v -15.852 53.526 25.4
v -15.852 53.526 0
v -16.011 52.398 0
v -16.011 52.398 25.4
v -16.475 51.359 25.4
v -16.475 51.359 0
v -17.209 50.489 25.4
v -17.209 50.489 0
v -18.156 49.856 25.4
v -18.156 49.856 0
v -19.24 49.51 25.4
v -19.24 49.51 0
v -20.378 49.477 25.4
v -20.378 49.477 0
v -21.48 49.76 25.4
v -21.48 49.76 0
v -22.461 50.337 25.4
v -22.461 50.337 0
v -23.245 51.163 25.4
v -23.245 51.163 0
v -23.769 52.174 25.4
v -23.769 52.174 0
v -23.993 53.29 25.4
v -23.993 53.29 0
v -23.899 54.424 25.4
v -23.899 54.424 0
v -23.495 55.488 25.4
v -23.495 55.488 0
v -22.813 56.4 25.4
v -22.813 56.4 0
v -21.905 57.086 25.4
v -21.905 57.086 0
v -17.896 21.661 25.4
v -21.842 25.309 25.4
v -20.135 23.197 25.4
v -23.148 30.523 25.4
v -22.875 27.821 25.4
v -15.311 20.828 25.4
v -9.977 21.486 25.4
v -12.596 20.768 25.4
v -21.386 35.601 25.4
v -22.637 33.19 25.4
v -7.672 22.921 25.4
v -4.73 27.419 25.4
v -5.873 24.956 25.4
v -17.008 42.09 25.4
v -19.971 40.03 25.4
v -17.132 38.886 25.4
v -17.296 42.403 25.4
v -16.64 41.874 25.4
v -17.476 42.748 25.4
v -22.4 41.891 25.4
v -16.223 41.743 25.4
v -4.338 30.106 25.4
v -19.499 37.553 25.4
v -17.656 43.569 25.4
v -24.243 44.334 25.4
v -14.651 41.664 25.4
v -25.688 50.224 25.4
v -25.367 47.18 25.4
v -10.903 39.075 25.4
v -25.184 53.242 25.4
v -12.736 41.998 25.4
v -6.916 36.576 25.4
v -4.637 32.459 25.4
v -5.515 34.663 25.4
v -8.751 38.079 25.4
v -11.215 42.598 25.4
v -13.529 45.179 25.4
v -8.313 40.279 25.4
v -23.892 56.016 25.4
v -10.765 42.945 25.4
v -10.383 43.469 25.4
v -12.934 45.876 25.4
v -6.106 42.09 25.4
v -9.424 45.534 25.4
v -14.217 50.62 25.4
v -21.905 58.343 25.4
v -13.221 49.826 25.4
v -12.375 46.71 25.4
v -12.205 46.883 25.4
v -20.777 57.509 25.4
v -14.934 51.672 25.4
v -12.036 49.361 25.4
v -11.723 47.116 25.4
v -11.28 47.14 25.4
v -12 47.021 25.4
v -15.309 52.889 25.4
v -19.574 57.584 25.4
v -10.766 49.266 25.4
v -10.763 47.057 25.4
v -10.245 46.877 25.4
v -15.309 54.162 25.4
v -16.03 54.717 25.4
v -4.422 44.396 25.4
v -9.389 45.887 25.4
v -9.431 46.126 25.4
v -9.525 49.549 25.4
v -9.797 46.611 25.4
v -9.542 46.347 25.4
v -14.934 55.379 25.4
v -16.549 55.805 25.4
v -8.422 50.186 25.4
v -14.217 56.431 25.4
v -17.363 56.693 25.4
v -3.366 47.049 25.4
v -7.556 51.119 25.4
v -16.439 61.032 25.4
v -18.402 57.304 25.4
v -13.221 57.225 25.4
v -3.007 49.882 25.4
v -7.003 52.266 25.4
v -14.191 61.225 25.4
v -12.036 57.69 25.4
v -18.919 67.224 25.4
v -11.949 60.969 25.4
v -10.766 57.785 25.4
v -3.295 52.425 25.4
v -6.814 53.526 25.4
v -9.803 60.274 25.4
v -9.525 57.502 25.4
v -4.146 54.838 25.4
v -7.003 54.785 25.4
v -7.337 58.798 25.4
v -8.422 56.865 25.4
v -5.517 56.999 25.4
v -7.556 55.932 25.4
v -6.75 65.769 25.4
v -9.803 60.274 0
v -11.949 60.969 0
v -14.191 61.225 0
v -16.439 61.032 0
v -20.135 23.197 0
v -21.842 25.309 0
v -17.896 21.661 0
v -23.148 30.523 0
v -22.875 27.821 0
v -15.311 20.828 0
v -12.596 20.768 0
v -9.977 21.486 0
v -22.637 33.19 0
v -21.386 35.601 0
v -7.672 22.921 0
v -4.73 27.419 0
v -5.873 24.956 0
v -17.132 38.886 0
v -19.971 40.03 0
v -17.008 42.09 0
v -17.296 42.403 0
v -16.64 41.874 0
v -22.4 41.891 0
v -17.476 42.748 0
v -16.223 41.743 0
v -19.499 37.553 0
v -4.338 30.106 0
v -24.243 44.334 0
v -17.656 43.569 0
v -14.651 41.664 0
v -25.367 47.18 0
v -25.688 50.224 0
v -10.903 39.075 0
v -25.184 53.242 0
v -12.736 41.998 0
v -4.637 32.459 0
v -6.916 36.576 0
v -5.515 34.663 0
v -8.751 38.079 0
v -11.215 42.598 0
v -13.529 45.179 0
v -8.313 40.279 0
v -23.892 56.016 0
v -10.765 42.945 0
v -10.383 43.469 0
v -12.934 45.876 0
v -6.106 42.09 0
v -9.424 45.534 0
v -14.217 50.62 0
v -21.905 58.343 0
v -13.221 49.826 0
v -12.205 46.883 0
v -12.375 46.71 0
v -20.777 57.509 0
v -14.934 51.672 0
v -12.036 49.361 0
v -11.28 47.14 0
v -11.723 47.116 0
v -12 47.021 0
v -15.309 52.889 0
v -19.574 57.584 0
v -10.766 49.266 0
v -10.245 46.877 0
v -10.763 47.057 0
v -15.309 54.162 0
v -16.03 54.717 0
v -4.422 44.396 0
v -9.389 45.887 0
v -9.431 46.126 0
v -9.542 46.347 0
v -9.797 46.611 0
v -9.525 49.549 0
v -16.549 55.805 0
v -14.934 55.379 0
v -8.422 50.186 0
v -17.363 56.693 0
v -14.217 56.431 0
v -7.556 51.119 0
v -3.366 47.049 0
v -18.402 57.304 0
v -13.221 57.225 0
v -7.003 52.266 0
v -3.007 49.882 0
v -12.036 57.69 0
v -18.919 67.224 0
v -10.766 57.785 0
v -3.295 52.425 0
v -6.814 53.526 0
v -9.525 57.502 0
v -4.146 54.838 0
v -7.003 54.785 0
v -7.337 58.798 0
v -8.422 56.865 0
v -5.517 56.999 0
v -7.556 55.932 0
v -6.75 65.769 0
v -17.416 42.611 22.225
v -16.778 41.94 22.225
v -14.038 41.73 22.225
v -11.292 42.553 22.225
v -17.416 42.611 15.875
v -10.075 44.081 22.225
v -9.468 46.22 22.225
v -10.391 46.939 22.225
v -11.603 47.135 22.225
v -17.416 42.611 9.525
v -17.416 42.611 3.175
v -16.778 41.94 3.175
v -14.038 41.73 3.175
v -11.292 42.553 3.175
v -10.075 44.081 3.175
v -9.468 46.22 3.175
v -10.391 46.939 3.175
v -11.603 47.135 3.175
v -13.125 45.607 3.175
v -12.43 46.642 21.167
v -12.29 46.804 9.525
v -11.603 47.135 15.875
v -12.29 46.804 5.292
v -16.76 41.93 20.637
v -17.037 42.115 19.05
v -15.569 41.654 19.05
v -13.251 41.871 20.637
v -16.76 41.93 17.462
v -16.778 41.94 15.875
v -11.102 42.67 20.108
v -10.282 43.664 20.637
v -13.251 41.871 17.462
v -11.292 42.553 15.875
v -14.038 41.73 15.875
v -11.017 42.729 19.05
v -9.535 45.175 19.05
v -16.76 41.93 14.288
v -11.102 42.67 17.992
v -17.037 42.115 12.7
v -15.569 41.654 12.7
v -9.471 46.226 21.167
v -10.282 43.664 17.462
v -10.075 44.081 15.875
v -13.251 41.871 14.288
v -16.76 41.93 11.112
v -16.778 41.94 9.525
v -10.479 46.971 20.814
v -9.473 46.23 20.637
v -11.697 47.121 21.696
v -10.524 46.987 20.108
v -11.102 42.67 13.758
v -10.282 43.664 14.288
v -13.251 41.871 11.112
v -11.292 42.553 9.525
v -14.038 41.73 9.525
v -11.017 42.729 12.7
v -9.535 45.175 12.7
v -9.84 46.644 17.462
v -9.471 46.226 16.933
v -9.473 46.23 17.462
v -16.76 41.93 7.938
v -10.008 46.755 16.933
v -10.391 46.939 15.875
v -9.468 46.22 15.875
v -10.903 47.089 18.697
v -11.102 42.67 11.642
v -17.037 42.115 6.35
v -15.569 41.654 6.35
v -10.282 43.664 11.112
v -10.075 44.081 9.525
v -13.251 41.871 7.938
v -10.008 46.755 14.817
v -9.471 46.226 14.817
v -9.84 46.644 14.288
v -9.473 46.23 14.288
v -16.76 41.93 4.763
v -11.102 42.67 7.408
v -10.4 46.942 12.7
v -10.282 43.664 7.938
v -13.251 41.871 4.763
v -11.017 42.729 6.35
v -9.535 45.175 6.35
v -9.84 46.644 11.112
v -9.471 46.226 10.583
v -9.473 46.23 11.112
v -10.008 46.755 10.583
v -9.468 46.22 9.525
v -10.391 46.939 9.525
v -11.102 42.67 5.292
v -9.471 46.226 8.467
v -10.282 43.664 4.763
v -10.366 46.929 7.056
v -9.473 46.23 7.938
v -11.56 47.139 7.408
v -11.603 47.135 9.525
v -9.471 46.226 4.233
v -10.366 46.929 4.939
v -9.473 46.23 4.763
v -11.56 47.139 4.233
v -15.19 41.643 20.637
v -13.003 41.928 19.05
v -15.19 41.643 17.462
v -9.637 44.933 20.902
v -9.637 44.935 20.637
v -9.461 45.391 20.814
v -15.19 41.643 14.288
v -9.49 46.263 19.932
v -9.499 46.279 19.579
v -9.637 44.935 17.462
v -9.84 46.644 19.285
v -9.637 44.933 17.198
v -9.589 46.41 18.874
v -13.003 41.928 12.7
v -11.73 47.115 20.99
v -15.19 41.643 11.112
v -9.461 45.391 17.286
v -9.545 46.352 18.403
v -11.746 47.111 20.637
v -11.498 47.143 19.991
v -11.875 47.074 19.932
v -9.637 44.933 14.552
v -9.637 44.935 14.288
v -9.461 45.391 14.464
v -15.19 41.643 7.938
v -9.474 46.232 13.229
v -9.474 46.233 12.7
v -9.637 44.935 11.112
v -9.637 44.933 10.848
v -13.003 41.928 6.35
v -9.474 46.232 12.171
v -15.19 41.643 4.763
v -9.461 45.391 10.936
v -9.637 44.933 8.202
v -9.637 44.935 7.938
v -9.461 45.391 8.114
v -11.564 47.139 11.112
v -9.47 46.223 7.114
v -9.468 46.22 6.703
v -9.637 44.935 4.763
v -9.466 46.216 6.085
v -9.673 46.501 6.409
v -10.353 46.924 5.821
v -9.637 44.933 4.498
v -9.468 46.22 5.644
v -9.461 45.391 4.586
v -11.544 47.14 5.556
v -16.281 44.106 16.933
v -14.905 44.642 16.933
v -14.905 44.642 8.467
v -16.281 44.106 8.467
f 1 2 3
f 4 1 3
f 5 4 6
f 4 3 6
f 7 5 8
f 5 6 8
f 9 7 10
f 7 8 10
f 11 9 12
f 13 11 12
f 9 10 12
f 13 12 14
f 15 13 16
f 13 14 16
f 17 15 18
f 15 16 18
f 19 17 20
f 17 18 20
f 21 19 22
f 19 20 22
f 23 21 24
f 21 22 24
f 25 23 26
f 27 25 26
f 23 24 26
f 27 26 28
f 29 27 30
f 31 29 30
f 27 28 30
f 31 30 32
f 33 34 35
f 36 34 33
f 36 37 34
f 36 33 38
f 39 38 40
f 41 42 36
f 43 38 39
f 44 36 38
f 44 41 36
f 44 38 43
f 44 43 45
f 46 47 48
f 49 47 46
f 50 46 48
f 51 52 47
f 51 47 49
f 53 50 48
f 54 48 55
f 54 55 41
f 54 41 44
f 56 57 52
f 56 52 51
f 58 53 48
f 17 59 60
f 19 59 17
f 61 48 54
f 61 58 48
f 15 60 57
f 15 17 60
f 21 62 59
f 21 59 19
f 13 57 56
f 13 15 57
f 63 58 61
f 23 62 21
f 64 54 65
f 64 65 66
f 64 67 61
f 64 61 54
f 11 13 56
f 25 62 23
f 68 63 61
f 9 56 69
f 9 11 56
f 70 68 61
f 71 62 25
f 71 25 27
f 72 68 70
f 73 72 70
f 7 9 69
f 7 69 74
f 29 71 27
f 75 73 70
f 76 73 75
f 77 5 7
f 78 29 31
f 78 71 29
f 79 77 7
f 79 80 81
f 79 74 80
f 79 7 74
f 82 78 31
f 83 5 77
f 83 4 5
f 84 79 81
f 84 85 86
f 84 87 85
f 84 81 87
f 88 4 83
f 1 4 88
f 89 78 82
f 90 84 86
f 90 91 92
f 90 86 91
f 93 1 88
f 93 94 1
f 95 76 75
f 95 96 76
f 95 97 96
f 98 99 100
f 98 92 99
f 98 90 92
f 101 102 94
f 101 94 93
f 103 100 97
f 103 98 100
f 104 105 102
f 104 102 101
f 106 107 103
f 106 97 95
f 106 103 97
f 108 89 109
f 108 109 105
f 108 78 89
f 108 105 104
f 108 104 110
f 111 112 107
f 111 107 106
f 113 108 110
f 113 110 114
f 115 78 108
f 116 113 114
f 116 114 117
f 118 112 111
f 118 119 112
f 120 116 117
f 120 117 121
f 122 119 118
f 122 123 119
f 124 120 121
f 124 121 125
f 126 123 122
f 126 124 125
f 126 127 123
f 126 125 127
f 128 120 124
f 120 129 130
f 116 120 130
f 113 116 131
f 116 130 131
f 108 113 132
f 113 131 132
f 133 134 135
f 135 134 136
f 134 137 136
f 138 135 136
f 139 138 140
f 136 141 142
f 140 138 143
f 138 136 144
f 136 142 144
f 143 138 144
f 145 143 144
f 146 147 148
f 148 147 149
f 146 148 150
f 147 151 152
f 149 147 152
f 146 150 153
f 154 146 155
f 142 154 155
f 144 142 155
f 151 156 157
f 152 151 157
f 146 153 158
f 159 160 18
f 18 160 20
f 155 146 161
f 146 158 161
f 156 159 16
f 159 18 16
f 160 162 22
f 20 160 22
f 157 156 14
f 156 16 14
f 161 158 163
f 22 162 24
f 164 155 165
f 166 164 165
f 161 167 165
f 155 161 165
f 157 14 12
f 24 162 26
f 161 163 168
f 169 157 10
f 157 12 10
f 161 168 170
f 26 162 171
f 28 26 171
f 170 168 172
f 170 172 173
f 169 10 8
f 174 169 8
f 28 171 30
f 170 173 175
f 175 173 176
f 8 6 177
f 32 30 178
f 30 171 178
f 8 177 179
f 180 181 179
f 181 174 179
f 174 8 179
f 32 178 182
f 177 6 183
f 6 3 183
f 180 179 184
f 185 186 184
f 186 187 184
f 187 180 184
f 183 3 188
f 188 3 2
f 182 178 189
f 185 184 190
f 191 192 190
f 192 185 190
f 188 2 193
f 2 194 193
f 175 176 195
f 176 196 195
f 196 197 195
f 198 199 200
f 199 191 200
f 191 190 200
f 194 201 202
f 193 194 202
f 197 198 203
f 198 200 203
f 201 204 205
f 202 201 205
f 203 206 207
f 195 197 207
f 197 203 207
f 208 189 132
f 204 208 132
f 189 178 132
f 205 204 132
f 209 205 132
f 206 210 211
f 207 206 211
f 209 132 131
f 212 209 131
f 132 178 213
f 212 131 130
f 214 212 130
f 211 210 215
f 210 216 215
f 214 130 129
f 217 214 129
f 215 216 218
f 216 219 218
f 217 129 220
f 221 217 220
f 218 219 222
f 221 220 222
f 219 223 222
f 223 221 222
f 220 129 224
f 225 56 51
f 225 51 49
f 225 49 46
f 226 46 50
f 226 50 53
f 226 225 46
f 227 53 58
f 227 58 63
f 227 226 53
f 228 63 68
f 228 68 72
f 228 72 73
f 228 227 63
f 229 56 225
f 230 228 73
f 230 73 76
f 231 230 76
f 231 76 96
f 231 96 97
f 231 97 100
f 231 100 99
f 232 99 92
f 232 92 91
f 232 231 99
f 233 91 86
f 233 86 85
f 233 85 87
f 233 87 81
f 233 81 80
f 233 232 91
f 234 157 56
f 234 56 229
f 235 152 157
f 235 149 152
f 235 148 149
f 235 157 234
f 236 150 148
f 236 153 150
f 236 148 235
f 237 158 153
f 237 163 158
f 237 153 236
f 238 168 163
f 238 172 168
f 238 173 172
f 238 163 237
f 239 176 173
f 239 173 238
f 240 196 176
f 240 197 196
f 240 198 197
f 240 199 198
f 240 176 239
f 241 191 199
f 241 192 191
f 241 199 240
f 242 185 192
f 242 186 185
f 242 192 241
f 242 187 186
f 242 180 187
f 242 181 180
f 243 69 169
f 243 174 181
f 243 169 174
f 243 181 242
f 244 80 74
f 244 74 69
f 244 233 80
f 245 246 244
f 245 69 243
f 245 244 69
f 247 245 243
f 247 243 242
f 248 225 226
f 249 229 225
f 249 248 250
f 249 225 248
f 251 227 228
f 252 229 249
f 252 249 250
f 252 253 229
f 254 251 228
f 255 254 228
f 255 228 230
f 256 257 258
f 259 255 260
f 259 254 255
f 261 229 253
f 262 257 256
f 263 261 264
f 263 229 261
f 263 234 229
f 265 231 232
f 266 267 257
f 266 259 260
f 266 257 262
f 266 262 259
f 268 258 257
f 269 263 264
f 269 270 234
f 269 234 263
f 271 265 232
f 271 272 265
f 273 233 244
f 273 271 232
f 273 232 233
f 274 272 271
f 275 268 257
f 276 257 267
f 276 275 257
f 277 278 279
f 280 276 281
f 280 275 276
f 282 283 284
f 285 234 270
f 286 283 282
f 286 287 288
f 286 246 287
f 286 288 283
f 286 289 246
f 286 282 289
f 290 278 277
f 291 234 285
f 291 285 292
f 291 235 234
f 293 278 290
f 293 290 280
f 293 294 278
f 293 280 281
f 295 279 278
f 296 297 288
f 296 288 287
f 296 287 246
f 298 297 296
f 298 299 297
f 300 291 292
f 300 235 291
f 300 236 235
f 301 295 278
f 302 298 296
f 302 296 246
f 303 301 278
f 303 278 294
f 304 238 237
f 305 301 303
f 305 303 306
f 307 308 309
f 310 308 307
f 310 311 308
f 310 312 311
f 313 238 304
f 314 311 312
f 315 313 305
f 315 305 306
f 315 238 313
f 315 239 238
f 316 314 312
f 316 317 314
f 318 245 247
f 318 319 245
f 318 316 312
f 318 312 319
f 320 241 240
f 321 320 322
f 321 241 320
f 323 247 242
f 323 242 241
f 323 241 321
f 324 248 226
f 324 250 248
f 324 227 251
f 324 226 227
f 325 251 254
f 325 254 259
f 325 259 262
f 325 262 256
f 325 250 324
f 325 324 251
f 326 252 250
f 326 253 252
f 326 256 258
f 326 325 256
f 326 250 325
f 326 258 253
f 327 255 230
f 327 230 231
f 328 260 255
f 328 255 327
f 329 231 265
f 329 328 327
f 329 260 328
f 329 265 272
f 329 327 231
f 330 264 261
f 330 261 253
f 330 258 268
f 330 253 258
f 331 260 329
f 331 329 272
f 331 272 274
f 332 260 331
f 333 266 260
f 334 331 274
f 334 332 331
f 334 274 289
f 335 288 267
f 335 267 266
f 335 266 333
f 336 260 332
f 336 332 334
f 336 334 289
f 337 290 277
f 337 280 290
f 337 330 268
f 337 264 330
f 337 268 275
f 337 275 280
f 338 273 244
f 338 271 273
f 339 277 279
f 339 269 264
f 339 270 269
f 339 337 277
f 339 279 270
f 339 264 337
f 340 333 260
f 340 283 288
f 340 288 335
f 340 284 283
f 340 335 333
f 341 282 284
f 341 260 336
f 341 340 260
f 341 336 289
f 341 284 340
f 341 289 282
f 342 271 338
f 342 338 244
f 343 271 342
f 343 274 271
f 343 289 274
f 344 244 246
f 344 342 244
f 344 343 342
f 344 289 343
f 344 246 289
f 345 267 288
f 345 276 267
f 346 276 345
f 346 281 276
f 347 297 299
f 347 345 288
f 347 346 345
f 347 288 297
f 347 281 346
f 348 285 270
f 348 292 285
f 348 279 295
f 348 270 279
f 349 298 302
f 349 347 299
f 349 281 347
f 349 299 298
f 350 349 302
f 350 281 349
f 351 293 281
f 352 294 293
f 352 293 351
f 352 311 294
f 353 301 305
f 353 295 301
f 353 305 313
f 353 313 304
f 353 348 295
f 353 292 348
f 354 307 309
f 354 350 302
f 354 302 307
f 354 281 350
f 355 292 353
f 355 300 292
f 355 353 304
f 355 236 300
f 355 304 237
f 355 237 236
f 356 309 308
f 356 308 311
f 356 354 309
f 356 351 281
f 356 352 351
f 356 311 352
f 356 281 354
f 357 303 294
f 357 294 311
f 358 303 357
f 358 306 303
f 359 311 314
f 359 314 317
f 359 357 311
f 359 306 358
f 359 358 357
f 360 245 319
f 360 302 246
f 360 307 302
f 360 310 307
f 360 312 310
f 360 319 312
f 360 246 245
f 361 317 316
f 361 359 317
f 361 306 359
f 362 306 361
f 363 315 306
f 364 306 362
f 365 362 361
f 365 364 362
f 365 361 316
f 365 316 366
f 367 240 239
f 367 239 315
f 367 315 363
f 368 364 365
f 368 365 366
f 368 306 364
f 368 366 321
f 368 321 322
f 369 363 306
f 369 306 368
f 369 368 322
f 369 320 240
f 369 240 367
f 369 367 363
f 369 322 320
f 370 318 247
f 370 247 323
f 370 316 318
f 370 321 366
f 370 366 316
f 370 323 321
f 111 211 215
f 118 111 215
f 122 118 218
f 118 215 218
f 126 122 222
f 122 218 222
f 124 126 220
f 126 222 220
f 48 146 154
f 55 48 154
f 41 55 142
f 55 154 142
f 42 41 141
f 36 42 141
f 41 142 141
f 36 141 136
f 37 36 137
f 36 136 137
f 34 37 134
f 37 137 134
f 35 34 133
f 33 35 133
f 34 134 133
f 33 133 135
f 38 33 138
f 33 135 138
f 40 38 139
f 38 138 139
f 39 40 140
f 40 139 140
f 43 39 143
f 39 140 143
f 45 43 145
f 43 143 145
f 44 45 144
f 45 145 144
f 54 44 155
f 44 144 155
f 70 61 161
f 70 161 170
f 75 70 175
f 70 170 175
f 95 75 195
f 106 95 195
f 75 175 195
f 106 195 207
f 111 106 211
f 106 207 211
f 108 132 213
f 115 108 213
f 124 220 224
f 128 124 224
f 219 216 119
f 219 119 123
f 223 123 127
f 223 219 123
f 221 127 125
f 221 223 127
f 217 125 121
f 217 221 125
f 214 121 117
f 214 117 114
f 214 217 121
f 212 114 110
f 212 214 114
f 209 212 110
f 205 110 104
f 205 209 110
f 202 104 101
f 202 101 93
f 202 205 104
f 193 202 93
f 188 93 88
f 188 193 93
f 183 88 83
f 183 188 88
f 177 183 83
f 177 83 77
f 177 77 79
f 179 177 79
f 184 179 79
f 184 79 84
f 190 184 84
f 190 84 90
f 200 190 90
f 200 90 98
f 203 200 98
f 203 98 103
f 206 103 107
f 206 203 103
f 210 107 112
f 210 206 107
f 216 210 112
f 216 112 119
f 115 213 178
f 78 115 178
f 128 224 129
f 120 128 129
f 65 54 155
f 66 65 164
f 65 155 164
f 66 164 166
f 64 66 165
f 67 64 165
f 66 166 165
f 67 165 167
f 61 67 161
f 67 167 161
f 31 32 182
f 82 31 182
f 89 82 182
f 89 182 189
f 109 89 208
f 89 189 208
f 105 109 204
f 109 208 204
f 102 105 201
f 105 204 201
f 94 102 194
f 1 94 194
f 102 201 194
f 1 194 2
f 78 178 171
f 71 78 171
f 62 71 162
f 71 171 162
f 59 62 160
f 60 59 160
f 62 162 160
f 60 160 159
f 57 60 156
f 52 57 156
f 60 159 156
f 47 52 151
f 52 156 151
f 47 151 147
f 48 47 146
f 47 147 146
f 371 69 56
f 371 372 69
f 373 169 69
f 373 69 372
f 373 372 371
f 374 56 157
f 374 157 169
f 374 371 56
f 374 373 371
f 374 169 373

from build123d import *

# Parameters (mm, degrees)
F0_R     = 4.2716595226
F1_DEPTH = 25.4


with BuildPart() as f1:
    # F0 (on Top) → F1 (new body)
    with BuildSketch(Plane.XY):
        with BuildLine():
            ThreePointArc((-10.9032178879, 39.0753542906), (-5.1910846605, 43.1900360944), (-3.0065766643, 49.8823449016))
            ThreePointArc((-3.0065766643, 49.8823449016), (-4.1464339764, 54.8381716861), (-7.3369236625, 58.7980036742))
            ThreePointArc((-7.3369236625, 58.7980036742), (-8.5228526065, 59.6145737818), (-9.8026699948, 60.2743325659))
            ThreePointArc((-9.8026699948, 60.2743325659), (-13.0636710755, 61.1524909109), (-16.4386810378, 61.0316692151))
            ThreePointArc((-16.4386810378, 61.0316692151), (-19.3556506827, 60.0613812277), (-21.9049728752, 58.3434967593))
            ThreePointArc((-21.9049728752, 58.3434967593), (-25.3666424741, 47.1802232161), (-17.1324710859, 38.8856313537))
            ThreePointArc((-17.1324710859, 38.8856313537), (-14.0340082646, 39.511204952), (-10.9032178879, 39.0753542906))
        make_face()
        with BuildLine():
            ThreePointArc((-15.8517292987, 53.5255260112), (-21.9910405068, 50.0141212063), (-21.9049728752, 57.0861575592))
            ThreePointArc((-21.9049728752, 57.0861575592), (-17.8600920101, 57.0369308162), (-15.8517292987, 53.5255260112))
        make_face(mode=Mode.SUBTRACT)
        with BuildLine():
            add(Edge.make_bspline(
                [(-17.6564005526, 43.5692086307), (-17.5851070368, 42.8667576073), (-16.9535474713, 40.9989798958), (-10.7844070302, 42.18138916), (-10.2438965659, 43.9538393646), (-8.6212871203, 46.4841986619), (-11.7256242893, 47.4607807156), (-12.5423545781, 46.5653166922), (-13.0225004053, 45.6741453494), (-13.3887298348, 45.3075260974), (-13.5288280789, 45.1787779989)],
                knots=[0.049875245, 0.049875245, 0.049875245, 0.049875245, 0.1481446361, 0.3526177575, 0.4742514854, 0.6040004548, 0.7366395955, 0.8278864756, 0.9191684515, 0.9736388756, 0.9736388756, 0.9736388756, 0.9736388756], degree=3))
            add(Edge.make_bspline(
                [(-13.5288280789, 45.1787779989), (-14.9046855695, 44.642254876), (-16.2805430601, 44.1057317532), (-17.6564005506, 43.5692086304)],
                knots=[0.0056922948, 0.0056922948, 0.0056922948, 0.0056922948, 4.4359934202, 4.4359934202, 4.4359934202, 4.4359934202], degree=3))
        make_face(mode=Mode.SUBTRACT)
        with Locations((-11.0852297941, 53.5255260112)):
            Circle(F0_R, mode=Mode.SUBTRACT)
        with BuildLine():
            ThreePointArc((-9.8026699948, 60.2743325659), (-8.5228526065, 59.6145737818), (-7.3369236625, 58.7980036742))
            Line((-7.3369236625, 58.7980036742), (-6.7503172904, 65.7686516643))
            Line((-6.7503172904, 65.7686516643), (-9.8026699948, 60.2743325659))
        make_face()
        with BuildLine():
            ThreePointArc((-4.3383381323, 30.106337741), (-6.1549153148, 35.6637855382), (-10.9032178879, 39.0753542906))
            ThreePointArc((-10.9032178879, 39.0753542906), (-14.0045594414, 38.5442993199), (-17.1324710859, 38.8856313537))
            ThreePointArc((-17.1324710859, 38.8856313537), (-19.0712979296, 22.3480222929), (-4.3383381323, 30.106337741))
        make_face()
        with BuildLine():
            ThreePointArc((-17.1324710859, 38.8856313537), (-14.0045594414, 38.5442993199), (-10.9032178879, 39.0753542906))
            ThreePointArc((-10.9032178879, 39.0753542906), (-14.0340082646, 39.511204952), (-17.1324710859, 38.8856313537))
        make_face()
        with BuildLine():
            ThreePointArc((-21.9049728752, 58.3434967593), (-19.3556506827, 60.0613812277), (-16.4386810378, 61.0316692151))
            Line((-16.4386810378, 61.0316692151), (-18.9191132756, 67.2242349982))
            Line((-18.9191132756, 67.2242349982), (-21.9049728752, 58.3434967593))
        make_face()
    extrude(amount=F1_DEPTH)


solid = f1.part
